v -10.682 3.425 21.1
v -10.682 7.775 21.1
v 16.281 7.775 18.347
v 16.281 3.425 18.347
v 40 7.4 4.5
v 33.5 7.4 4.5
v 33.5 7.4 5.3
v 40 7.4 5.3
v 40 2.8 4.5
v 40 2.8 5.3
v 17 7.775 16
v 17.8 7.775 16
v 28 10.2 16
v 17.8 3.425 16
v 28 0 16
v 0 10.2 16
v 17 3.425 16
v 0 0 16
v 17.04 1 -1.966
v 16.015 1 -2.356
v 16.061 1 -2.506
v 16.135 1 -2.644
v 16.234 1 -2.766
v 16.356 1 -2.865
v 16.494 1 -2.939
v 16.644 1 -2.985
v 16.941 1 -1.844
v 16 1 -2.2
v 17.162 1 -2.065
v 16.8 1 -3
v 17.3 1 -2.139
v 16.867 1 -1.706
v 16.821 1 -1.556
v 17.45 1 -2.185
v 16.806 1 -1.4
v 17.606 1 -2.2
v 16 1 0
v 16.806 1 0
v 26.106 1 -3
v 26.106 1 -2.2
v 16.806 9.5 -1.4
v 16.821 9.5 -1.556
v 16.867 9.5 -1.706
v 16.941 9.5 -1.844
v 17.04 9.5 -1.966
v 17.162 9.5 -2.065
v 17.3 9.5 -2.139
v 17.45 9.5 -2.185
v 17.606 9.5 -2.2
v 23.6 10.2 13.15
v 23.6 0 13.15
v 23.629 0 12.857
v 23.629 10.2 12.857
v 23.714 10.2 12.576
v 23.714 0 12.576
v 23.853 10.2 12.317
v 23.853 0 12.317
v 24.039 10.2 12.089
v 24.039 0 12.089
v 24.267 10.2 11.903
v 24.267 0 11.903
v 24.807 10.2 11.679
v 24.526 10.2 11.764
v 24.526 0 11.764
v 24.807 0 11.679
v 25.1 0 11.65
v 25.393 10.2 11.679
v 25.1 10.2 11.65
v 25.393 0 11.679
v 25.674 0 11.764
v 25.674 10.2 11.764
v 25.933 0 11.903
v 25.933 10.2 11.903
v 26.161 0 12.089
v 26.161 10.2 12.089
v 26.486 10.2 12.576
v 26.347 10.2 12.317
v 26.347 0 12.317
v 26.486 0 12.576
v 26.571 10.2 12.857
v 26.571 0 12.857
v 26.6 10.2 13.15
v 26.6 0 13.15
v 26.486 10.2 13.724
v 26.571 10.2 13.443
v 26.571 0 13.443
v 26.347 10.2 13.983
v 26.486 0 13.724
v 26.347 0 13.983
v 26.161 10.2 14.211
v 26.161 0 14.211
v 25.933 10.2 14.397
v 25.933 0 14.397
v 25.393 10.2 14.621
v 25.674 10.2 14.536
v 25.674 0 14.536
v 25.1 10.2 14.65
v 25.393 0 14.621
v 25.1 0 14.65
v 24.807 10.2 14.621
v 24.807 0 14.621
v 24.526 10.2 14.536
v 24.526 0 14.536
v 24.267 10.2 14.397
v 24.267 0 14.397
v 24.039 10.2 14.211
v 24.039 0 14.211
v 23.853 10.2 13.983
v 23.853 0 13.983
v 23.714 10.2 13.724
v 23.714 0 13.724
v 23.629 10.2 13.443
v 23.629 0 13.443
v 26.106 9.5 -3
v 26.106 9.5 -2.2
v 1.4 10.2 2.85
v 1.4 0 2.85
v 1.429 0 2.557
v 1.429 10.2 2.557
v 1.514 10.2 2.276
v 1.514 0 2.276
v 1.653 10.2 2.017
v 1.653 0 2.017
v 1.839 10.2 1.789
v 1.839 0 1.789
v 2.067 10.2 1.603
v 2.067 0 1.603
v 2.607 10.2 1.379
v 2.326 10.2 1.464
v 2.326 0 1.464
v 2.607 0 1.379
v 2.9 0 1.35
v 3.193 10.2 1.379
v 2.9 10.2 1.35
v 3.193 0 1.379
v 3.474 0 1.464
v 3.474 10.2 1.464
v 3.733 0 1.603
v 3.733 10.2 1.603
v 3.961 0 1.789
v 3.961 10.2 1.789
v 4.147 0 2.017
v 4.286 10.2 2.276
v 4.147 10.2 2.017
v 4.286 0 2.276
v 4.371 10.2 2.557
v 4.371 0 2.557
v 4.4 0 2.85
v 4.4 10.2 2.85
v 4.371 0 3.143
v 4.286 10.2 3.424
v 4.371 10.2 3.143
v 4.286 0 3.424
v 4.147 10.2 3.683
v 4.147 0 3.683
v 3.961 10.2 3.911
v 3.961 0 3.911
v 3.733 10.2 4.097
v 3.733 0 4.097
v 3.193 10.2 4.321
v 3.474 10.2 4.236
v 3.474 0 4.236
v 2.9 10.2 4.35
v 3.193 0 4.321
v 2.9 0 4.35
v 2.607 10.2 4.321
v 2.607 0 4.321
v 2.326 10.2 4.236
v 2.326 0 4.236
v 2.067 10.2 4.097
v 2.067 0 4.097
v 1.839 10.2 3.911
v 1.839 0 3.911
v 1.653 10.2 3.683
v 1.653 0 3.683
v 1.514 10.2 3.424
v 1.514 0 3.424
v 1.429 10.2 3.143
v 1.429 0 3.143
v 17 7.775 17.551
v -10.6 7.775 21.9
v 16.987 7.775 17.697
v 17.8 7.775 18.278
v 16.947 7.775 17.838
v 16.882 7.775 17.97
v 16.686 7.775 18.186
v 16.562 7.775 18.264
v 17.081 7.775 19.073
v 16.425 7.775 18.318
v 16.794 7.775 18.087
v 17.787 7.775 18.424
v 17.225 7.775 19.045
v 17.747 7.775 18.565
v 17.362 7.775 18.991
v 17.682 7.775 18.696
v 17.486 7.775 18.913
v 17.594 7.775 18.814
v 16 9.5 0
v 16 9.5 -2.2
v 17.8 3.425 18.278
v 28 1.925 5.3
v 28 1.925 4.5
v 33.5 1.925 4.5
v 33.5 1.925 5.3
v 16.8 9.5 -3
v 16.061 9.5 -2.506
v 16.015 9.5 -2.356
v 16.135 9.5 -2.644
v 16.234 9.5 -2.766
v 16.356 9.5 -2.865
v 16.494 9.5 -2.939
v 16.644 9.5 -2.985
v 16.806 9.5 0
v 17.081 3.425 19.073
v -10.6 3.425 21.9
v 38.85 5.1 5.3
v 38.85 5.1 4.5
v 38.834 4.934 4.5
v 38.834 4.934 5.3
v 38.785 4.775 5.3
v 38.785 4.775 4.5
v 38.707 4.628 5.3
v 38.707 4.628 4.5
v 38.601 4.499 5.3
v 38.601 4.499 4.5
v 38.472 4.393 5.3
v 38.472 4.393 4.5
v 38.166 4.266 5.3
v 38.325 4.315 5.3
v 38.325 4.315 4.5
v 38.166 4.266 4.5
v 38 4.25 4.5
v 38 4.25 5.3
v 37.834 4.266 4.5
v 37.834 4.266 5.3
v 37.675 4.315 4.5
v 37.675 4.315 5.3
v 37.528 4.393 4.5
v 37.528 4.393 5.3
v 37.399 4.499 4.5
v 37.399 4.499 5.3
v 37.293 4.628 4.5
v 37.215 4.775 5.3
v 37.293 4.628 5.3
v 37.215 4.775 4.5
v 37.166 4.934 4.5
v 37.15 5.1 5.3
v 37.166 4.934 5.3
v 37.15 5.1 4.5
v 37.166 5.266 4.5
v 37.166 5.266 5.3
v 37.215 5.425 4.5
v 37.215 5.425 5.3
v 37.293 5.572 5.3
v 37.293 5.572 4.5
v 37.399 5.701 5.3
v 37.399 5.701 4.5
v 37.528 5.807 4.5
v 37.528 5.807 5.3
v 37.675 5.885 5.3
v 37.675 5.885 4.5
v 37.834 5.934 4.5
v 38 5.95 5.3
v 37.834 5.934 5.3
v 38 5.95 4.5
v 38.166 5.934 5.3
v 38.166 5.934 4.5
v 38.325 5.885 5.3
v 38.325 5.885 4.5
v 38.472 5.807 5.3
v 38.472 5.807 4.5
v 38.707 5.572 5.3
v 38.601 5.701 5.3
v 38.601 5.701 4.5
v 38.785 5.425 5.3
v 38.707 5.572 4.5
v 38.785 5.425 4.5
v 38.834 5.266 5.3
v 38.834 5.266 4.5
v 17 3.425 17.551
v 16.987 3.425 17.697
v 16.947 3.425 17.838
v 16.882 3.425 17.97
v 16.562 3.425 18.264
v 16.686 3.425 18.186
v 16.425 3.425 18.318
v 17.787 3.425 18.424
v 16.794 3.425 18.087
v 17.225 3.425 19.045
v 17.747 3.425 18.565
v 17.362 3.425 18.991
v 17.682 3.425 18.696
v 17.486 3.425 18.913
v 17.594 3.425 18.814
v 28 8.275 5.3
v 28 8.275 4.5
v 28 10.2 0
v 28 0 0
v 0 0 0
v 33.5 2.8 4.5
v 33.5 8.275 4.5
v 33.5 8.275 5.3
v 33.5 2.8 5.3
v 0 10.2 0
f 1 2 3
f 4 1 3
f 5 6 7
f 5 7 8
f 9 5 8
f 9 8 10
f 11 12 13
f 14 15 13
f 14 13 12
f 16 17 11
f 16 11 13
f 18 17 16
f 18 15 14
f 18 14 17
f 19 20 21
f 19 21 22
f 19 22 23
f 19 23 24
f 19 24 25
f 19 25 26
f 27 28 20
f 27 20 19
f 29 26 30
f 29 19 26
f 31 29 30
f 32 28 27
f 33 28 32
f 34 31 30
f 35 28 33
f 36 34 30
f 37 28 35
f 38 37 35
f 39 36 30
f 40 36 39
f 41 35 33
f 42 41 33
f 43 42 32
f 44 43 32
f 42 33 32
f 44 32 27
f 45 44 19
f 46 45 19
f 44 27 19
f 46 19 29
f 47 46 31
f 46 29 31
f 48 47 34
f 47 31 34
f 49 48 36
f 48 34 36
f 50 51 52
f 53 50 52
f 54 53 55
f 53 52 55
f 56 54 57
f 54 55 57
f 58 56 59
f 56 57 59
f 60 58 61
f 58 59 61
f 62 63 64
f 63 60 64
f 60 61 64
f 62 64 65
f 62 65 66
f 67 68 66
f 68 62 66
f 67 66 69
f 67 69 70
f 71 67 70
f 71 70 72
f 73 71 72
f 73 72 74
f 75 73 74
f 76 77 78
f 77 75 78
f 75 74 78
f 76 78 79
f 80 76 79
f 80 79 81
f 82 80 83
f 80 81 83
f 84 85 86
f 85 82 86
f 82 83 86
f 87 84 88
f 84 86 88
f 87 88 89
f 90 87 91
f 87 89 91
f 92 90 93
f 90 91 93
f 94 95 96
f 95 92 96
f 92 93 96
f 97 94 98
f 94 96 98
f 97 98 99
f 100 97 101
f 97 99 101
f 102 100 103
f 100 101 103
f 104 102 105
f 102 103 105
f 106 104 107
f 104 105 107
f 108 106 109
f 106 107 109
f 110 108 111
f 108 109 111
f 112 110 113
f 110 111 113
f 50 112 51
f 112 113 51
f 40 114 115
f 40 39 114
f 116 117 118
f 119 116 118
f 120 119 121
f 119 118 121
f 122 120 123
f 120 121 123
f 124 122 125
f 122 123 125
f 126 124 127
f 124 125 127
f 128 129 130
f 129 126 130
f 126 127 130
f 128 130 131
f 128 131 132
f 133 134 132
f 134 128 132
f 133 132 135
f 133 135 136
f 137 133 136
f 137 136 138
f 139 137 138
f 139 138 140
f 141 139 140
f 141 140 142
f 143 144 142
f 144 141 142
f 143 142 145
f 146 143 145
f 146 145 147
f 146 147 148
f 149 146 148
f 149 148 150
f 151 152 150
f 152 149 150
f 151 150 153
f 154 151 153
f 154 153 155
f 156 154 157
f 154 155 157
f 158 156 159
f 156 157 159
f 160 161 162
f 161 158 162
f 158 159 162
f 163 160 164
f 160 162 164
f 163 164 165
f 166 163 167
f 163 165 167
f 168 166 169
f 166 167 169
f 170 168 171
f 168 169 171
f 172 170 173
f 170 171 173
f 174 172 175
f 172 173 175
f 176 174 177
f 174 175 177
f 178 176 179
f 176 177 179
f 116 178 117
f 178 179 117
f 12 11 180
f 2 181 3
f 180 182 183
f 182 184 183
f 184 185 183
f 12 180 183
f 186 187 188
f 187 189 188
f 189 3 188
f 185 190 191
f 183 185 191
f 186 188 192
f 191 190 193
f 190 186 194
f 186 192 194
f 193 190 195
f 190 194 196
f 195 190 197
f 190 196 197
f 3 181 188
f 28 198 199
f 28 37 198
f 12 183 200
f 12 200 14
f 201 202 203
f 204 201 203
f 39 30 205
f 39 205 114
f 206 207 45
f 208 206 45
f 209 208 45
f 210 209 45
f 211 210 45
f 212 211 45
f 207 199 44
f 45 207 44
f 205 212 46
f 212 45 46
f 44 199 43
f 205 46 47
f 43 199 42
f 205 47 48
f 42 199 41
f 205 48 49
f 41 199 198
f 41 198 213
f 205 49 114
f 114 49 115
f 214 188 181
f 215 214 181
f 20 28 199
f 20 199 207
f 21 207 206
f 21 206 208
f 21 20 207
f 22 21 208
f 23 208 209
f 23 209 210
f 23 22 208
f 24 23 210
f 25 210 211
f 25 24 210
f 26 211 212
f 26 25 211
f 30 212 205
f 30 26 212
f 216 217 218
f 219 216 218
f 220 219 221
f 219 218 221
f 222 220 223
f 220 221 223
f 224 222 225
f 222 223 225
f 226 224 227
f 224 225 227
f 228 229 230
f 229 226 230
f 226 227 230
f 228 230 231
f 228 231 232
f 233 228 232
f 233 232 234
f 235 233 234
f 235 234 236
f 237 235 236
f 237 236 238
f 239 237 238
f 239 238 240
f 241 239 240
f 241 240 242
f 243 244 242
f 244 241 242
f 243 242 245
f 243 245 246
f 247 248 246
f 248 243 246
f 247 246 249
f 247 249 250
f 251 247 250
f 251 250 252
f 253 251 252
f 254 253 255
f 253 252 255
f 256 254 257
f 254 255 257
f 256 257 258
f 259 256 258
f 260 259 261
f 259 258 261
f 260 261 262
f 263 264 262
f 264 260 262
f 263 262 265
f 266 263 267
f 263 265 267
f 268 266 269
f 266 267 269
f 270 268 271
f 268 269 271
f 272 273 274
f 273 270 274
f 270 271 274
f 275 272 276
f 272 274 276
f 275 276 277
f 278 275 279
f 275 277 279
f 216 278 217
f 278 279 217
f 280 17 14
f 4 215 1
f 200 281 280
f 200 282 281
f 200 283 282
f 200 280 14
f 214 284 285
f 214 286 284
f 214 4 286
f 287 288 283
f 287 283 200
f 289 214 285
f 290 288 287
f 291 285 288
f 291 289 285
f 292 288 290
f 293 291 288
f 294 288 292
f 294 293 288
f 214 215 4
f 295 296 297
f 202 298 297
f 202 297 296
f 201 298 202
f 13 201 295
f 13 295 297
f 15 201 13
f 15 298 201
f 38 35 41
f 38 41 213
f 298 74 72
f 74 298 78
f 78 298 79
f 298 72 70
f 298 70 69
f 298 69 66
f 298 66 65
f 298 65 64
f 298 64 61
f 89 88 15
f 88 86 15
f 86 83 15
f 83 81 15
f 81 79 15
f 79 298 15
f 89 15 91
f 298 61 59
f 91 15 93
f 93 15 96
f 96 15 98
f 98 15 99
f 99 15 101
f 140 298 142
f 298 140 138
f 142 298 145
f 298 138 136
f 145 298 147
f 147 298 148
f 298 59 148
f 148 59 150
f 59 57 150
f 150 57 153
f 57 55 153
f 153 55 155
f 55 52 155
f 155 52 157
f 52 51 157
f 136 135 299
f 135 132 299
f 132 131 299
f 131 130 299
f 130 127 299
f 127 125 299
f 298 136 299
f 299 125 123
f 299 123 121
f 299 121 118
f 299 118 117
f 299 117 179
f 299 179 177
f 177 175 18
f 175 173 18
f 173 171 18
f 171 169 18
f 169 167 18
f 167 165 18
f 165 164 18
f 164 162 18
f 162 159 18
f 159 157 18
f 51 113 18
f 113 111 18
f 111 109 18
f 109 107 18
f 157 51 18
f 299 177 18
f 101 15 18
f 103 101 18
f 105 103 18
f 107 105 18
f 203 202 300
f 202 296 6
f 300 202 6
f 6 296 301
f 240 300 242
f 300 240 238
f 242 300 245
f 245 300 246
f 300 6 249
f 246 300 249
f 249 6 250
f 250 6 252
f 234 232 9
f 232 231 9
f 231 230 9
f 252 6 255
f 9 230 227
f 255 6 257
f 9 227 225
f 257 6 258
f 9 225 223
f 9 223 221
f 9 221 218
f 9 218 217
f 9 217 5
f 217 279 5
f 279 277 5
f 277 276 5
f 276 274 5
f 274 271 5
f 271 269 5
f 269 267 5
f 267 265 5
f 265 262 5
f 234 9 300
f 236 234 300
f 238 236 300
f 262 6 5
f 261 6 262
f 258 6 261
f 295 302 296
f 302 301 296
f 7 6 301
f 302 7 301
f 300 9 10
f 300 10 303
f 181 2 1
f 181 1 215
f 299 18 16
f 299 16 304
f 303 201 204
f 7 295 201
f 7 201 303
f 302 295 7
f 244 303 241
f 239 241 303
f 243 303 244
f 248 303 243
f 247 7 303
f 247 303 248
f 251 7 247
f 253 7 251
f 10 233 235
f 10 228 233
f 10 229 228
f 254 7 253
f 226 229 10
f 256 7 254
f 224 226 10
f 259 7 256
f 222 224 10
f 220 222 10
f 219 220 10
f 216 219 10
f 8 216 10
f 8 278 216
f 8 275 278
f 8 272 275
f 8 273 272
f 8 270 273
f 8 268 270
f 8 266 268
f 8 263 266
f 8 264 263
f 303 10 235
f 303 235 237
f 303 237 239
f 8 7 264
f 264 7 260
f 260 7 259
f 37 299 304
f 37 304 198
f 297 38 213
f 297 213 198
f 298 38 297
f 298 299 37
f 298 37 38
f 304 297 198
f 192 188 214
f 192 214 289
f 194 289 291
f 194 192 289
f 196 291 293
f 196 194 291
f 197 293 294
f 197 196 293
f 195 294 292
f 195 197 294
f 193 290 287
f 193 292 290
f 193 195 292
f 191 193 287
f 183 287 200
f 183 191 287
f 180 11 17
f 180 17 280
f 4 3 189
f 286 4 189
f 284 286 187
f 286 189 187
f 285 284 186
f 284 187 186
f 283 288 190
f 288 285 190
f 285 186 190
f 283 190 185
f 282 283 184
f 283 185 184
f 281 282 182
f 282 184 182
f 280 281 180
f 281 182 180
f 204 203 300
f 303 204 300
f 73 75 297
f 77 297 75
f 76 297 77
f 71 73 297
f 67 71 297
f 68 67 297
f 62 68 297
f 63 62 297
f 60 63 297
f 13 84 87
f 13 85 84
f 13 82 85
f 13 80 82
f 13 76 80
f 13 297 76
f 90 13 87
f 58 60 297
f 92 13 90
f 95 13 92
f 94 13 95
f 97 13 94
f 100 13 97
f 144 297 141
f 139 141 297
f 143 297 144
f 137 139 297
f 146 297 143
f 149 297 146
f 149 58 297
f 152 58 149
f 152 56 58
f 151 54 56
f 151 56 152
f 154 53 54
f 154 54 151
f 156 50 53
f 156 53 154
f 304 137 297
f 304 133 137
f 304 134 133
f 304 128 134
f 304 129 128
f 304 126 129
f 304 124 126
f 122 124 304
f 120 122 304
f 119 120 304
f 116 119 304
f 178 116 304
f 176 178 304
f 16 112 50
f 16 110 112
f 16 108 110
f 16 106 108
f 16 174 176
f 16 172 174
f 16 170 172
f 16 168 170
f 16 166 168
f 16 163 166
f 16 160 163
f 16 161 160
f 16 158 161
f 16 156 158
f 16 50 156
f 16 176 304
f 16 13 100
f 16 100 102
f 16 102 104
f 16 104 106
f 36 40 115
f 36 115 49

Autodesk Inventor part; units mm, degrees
ref_plane "YZ Plane" through (0, 0, 0) normal (1, 0, 0) x (0, 1, 0)
ref_plane "XZ Plane" through (0, 0, 0) normal (0, 1, 0) x (-1, 0, 0)
sketch "Sketch1" plane through (0, 0, 0) normal (0, 1, 0) x (-1, 0, 0)
  line L0 (0, 0) -> (-28, 0)
  line L1 (-28, 0) -> (-28, 16)
  line L2 (-28, 16) -> (0, 16)
  line L3 (0, 16) -> (0, 0)
  circle A0 centre (-25.1, 13.15) radius 1.5
  circle A1 centre (-2.9, 2.85) radius 1.5
  line L4 (-28, 8) -> (0, 8) construction
  line L5 (-14, 0) -> (-14, 16) construction
  line L6 (-25.1, 13.15) -> (-28, 13.15) construction
  line L7 (-25.1, 13.15) -> (-25.1, 16) construction
  line L8 (-2.9, 2.85) -> (-2.9, 0) construction
  line L9 (-2.9, 2.85) -> (0, 2.85) construction
  dimension "d0" = 28
  dimension "d1" = 16
  dimension "d2" = 3
  dimension "d3" = 3
  dimension "d4" = 22.2
  dimension "d5" = 10.3
extrude "Extrusion1" add sketch "Sketch1" along normal blind 10.2
ref_plane "Work Plane1" through (0, 0, 4.5) normal (0, 0, 1) x (1, 0, 0)
sketch "Sketch2" plane through (0, 0, 4.5) normal (0, 0, 1) x (1, 0, 0)
  line L0 (28, 1.925) -> (33.5, 1.925)
  line L1 (33.5, 1.925) -> (33.5, 2.8)
  line L2 (33.5, 8.275) -> (28, 8.275)
  line L3 (28, 8.275) -> (28, 1.925)
  line L4 (33.5, 7.4) -> (40, 7.4)
  line L5 (40, 7.4) -> (40, 2.8)
  line L6 (40, 2.8) -> (33.5, 2.8)
  line L7 (33.5, 7.4) -> (33.5, 8.275)
  line L8 (33.5, 2.8) -> (33.5, 7.4) construction
  line L9 (28, 1.925) -> (28, 0) construction
  line L10 (28, 8.275) -> (28, 10.2) construction
  circle A0 centre (38, 5.1) radius 0.85
  line L11 (38, 5.1) -> (38, 2.8) construction
  line L12 (38, 7.4) -> (38, 5.1) construction
  point P0 (0, 0)
  dimension "d12" = 6.5
  dimension "d13" = 1.7
  dimension "d14" = 2
  dimension "d15" = 12
  dimension "d16" = 4.6
  dimension "d17" = 6.35
extrude "Extrusion2" add sketch "Sketch2" along normal blind 0.8
ref_plane "Work Plane2" through (0, 1, 0) normal (0, -1, 0) x (1, 0, 0)
sketch "Sketch4" plane through (0, 1, 0) normal (0, -1, 0) x (1, 0, 0)
  line L0 (16.8061, 0) -> (16, 0)
  line L1 (16, 0) -> (16, -2.2)
  line L2 (16.8, -3) -> (16.8, -3)
  line L3 (16.8, -3) -> (26.1061, -3)
  line L4 (26.1061, -3) -> (26.1061, -2.2)
  line L5 (26.1061, -2.2) -> (17.6061, -2.2)
  line L6 (16.8061, -1.4) -> (16.8061, 0)
  arc A0 (16, -2.2) -> (16.8, -3) centre (16.8, -2.2) ccw
  arc A1 (16.8061, -1.4) -> (17.6061, -2.2) centre (17.6061, -1.4) ccw
  line L7 (0, 0) -> (0, 16) projected
  point P0 (16, -3)
  point P1 (16.8061, -2.2)
  dimension "d32" = 0.8
  dimension "d33" = 3
  dimension "d34" = 9.3
  dimension "d35" = 0.8
  dimension "d36" = 0.8
  dimension "d41" = 16
extrude "Extrusion3" add sketch "Sketch4" against normal blind 8.5
sketch "Sketch5" plane through (0, 1, 0) normal (0, -1, 0) x (1, 0, 0)
  line L0 (28, 16) -> (0, 16) projected
  line L1 (17.8, 16) -> (17, 16)
  line L2 (17, 16) -> (17, 17.5509)
  line L3 (17, 19) -> (17.8, 19) construction
  line L4 (17.8, 18.2775) -> (17.8, 16)
  line L5 (0, 0) -> (0, 16) projected
  line L6 (17.0813, 19.0734) -> (-10.6, 21.9)
  line L7 (-10.6817, 21.1) -> (-10.6, 21.9)
  line L8 (-10.6817, 21.1) -> (16.2813, 18.3467)
  line L9 (26.1061, -3) -> (16.8, -3) projected
  line L10 (40, 4.5) -> (40, 5.3) projected
  line L11 (17, 18.2733) -> (17, 19) construction
  arc A0 (17, 17.5509) -> (16.2813, 18.3467) centre (16.2, 17.5509) ccw
  arc A1 (17.8, 18.2775) -> (17.0813, 19.0734) centre (17, 18.2775) ccw
  dimension "d44" = 0.8
  dimension "d45" = 3
  dimension "d46" = 17
  dimension "d48" = 0.8
  dimension "d49" = 24.9
  dimension "d50" = 50.6
  dimension "d51" = 0.8
ref_plane "Work Plane4" through (0, 5.6, 0) normal (0, -1, 0) x (1, 0, 0)
sketch "Sketch6" plane through (0, 5.6, 0) normal (0, -1, 0) x (1, 0, 0)
  line L0 (17.8, 16) -> (17, 16)
  line L1 (17, 16) -> (17, 17.5509)
  line L2 (17, 19) -> (17.8, 19) construction
  line L3 (17.8, 18.2775) -> (17.8, 16)
  line L4 (17.0813, 19.0734) -> (-10.6, 21.9)
  line L5 (-10.6817, 21.1) -> (-10.6, 21.9)
  line L6 (-10.6817, 21.1) -> (16.2813, 18.3467)
  line L7 (17, 18.2733) -> (17, 19) construction
  arc A0 (17, 17.5509) -> (16.2813, 18.3467) centre (16.2, 17.5509) ccw
  arc A1 (17.8, 18.2775) -> (17.0813, 19.0734) centre (17, 18.2775) ccw
  line L8 (40, 4.5) -> (40, 5.3) projected
  line L9 (16.8, -3) -> (26.1061, -3) projected
  line L10 (0, 16) -> (0, 0) projected
  dimension "d54" = 0.8
  dimension "d55" = 3
  dimension "d57" = 0.8
  dimension "d60" = 0.8
  dimension "d61" = 50.6
  dimension "d62" = 24.9
  dimension "d63" = 17
extrude "Extrusion5" add sketch "Sketch6" along normal mid plane 4.35
properties part number "game-switch"
